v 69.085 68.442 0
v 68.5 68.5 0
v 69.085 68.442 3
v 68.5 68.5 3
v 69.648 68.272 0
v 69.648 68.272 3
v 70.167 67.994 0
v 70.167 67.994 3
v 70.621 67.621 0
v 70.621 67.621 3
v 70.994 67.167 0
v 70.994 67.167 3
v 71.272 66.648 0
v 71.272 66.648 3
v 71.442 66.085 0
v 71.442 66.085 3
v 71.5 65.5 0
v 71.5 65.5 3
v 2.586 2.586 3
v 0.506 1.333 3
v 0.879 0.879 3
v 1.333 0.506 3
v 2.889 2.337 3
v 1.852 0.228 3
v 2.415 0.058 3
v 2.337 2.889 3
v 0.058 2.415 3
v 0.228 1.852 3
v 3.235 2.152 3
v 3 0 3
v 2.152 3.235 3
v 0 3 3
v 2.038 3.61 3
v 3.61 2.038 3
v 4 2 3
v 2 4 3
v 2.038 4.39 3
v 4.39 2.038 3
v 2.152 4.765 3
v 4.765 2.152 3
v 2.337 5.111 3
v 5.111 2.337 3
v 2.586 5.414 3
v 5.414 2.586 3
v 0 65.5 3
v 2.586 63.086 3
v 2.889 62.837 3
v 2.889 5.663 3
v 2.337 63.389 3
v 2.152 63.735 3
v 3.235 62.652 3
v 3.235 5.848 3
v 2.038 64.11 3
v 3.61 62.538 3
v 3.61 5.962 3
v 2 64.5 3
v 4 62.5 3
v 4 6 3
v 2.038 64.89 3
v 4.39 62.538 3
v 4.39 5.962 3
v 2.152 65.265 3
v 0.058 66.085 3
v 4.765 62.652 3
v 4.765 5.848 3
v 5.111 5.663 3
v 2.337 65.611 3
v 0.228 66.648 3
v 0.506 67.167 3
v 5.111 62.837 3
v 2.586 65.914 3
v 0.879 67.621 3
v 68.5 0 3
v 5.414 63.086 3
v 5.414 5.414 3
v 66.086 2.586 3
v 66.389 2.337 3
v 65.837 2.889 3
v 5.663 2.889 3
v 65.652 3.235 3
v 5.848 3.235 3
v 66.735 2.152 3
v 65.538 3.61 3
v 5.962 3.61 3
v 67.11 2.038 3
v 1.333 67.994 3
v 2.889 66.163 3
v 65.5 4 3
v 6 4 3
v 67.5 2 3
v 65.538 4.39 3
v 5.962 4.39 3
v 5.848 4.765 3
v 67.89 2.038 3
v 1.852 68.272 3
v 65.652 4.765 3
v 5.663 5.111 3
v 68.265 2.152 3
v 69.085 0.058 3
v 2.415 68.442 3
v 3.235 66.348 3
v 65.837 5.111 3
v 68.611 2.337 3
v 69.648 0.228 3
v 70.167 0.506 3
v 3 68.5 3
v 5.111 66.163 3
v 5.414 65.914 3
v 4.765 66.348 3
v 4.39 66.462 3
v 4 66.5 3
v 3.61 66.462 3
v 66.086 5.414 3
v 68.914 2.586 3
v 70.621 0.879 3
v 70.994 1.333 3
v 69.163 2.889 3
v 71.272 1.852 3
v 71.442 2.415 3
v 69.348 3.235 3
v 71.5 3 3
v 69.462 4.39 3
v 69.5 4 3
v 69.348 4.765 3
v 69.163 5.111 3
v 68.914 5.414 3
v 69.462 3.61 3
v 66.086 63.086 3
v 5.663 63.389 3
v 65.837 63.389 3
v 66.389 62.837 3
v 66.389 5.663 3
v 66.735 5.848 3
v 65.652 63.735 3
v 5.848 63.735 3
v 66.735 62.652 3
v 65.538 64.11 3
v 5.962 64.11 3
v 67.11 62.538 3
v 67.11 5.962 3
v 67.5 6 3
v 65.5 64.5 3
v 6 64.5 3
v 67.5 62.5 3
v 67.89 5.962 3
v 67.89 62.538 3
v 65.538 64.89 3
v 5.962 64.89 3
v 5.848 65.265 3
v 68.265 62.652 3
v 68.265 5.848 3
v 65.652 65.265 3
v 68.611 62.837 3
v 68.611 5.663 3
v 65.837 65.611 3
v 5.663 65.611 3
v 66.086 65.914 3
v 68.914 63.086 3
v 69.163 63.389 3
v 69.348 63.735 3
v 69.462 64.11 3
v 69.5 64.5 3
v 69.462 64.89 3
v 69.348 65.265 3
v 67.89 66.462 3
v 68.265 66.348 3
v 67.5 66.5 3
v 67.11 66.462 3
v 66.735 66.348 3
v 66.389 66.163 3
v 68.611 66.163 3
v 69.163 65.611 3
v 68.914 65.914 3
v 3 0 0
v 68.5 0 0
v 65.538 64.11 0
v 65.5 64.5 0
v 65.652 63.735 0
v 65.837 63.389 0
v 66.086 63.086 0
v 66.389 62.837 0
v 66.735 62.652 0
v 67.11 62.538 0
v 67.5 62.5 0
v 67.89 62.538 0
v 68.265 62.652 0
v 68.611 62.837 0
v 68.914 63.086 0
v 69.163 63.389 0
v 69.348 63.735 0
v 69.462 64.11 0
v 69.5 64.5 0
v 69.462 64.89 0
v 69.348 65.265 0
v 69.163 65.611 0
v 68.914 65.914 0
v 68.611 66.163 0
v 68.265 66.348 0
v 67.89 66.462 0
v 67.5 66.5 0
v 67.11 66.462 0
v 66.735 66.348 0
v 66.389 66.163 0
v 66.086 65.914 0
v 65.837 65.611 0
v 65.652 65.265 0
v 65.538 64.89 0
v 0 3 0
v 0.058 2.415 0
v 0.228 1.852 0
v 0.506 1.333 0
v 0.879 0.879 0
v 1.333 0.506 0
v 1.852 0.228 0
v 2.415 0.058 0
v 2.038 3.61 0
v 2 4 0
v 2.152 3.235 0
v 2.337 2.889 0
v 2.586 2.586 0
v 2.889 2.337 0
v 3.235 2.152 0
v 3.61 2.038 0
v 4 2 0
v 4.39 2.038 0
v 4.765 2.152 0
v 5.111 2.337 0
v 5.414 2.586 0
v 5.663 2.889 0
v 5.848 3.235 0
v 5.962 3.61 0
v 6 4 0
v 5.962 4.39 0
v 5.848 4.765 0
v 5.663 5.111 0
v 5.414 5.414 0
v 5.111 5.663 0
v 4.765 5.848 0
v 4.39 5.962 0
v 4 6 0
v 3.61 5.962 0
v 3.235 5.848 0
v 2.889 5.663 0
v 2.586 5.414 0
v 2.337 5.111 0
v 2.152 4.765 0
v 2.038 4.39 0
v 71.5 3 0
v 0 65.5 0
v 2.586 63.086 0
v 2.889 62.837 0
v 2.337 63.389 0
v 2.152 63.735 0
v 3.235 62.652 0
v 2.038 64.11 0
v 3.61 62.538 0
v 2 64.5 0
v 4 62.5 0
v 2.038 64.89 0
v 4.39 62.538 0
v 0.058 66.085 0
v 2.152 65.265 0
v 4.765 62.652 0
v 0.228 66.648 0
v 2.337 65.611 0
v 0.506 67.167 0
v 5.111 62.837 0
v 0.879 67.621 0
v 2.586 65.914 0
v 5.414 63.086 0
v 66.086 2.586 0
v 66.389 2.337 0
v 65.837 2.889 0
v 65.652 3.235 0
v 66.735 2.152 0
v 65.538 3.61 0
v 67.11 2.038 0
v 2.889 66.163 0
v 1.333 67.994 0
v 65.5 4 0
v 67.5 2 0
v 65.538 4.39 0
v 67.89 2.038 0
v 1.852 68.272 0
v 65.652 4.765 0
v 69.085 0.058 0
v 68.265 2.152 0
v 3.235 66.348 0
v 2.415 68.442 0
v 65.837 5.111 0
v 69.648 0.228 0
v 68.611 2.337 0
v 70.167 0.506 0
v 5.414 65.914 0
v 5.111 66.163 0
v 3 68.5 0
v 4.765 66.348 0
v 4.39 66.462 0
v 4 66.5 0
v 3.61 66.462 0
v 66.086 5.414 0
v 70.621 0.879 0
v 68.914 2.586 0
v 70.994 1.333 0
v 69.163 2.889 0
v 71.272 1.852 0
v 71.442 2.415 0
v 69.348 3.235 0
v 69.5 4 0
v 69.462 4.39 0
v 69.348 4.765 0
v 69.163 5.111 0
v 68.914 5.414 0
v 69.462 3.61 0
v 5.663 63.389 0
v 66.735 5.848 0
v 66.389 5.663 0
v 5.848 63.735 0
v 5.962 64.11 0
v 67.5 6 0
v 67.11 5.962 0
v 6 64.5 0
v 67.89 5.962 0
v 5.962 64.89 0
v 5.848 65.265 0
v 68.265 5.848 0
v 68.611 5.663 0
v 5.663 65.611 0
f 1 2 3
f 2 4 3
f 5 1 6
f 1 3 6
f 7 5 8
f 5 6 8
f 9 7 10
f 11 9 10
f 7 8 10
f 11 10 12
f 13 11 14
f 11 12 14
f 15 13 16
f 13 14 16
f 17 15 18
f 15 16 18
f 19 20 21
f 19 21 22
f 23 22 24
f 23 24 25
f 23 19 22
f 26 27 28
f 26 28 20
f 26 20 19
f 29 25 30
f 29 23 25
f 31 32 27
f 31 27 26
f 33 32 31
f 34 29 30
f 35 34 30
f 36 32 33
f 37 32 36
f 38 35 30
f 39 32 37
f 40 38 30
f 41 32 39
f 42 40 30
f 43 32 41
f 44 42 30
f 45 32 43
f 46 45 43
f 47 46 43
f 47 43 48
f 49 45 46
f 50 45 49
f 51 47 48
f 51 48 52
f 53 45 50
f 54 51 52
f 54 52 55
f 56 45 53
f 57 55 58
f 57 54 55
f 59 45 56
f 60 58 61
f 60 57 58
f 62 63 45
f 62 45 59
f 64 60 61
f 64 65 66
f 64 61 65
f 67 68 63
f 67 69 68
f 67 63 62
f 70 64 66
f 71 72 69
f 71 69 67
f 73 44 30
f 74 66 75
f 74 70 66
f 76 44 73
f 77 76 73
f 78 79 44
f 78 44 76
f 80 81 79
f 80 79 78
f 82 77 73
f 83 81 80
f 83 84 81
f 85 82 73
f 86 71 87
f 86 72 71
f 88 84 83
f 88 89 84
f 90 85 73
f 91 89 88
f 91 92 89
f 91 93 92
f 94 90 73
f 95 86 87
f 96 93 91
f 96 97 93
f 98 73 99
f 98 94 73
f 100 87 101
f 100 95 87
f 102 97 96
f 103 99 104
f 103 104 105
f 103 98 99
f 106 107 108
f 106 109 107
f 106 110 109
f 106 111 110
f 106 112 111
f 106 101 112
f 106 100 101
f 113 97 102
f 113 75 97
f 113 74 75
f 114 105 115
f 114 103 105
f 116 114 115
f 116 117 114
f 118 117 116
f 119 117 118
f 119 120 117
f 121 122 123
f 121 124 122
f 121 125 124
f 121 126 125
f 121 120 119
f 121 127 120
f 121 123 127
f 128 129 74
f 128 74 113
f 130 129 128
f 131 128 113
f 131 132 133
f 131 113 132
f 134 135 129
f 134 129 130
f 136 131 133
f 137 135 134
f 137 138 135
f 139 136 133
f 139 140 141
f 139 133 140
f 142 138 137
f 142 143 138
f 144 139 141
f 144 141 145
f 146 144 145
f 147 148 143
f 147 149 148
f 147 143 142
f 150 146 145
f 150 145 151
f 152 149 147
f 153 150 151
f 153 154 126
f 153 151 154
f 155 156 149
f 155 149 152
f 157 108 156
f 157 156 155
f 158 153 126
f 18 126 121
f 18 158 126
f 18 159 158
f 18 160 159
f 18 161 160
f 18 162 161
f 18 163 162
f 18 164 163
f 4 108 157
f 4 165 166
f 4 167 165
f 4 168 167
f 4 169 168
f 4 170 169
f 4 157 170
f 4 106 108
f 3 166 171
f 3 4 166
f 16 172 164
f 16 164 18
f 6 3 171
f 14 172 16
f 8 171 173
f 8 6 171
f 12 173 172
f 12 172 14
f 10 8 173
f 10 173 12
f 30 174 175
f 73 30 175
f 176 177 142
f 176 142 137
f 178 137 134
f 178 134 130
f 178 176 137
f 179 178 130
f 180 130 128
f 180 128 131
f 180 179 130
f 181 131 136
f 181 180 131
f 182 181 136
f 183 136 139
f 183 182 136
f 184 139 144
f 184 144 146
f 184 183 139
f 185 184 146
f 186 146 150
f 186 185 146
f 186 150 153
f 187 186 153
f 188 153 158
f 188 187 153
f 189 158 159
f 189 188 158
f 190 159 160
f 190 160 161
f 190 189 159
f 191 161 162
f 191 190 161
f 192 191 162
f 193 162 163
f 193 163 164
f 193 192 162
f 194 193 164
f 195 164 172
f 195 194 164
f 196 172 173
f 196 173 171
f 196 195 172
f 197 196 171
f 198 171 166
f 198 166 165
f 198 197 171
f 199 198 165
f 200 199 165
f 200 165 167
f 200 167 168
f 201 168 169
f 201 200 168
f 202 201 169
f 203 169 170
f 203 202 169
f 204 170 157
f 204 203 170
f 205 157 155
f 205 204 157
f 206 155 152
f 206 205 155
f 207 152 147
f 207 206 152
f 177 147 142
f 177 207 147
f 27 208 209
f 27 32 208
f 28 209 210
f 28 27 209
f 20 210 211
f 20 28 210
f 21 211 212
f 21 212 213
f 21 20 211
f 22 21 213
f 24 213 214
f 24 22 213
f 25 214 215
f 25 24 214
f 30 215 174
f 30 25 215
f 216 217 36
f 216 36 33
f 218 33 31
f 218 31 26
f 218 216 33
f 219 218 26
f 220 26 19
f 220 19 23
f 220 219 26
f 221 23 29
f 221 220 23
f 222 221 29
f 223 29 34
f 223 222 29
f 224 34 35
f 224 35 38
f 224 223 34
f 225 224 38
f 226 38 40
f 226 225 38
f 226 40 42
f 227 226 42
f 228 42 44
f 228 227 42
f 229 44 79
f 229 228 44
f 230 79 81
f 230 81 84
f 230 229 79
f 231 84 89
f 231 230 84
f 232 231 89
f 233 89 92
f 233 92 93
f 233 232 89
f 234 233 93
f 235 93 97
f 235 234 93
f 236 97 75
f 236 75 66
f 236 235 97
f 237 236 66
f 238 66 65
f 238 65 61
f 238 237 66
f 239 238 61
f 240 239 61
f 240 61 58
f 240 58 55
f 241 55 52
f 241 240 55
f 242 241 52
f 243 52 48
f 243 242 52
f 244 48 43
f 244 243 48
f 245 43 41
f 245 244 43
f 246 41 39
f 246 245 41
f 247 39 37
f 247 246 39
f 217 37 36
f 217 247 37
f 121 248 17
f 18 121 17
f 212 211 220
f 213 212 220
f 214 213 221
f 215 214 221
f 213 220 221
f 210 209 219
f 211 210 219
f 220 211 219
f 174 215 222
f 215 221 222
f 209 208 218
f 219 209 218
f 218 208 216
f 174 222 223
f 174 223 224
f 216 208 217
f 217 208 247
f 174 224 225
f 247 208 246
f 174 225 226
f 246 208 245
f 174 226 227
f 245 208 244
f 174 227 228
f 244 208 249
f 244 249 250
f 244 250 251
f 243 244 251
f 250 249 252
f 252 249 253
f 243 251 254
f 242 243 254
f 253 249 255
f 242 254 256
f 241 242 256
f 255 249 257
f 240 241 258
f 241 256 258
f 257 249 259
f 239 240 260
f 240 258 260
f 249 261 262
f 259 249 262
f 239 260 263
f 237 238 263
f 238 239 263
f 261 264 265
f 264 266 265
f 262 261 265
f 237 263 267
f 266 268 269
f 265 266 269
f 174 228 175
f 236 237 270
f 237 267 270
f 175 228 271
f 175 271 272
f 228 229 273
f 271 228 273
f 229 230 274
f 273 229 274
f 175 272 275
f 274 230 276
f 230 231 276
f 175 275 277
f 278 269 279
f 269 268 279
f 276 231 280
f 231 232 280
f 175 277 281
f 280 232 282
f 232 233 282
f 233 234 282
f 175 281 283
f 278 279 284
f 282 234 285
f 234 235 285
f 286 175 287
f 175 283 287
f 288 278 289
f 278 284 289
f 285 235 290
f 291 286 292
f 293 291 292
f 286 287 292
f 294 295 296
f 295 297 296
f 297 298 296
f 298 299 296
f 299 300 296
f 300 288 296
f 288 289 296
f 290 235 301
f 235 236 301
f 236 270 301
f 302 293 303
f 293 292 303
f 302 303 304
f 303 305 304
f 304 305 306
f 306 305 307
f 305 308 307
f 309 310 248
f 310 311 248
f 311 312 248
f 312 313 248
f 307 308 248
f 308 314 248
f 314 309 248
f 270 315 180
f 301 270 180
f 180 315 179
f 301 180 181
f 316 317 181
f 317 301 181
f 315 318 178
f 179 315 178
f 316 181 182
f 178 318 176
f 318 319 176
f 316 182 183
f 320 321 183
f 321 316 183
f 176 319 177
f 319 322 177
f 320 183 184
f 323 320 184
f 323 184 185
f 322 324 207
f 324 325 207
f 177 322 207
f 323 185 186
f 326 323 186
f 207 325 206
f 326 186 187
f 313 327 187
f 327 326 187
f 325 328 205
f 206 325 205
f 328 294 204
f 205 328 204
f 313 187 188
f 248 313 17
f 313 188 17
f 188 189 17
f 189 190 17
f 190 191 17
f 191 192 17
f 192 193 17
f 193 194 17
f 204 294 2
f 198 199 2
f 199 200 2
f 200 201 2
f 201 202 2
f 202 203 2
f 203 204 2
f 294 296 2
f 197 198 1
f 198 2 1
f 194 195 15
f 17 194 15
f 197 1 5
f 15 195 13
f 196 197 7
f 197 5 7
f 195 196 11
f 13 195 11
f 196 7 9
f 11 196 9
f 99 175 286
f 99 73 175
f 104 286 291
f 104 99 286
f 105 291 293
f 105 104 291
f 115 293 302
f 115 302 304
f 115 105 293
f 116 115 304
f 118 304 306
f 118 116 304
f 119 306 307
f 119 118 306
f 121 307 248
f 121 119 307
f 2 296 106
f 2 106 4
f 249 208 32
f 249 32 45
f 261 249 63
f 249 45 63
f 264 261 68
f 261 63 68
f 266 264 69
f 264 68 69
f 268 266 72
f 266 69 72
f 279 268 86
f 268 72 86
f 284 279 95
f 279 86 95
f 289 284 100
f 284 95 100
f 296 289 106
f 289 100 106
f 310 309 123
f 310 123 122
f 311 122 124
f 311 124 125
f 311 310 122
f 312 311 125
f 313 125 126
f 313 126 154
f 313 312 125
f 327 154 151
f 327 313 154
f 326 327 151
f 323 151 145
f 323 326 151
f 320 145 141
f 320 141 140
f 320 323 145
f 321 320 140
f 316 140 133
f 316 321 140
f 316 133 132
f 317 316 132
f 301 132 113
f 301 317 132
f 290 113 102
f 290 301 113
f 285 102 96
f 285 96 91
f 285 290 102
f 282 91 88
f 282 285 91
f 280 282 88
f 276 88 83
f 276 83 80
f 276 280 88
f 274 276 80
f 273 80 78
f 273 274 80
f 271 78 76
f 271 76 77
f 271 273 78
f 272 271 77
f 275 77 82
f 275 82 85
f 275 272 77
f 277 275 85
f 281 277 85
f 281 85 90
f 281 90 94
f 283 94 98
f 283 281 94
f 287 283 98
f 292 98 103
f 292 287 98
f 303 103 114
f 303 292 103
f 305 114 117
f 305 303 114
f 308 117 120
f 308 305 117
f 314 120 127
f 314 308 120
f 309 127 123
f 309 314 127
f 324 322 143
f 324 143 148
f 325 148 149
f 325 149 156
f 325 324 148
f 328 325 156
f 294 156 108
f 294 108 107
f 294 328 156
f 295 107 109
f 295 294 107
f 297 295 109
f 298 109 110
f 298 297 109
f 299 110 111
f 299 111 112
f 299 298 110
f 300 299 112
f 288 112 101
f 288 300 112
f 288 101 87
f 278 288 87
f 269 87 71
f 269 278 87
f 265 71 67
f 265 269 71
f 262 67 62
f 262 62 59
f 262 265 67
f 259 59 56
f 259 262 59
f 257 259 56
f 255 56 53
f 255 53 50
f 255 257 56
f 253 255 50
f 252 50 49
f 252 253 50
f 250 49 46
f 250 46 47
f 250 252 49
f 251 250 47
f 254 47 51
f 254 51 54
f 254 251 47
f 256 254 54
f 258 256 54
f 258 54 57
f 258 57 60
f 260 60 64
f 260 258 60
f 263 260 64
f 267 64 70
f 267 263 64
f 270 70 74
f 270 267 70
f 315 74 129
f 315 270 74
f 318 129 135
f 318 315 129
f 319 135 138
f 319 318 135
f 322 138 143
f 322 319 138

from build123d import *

# Parameters (mm, degrees)
ESBO_O1_W                = 71.5
ESBO_O1_H                = 68.5
ESBO_O1_R                = 2
RESSALTO_EXTRUS_O1_DEPTH = 3
FILETE1_R                = 3


with BuildPart() as part:
    # Esboço1 → Ressalto-extrusão1 (new body)
    with BuildSketch(Plane.XY):
        with Locations((35.75, 34.25)):
            Rectangle(ESBO_O1_W, ESBO_O1_H)
        with Locations((4, 64.5)):
            Circle(ESBO_O1_R, mode=Mode.SUBTRACT)
        with Locations(Location((67.5, 64.5, 0), (0, 0, 180))):
            Circle(ESBO_O1_R, mode=Mode.SUBTRACT)
        with Locations((67.5, 4)):
            Circle(ESBO_O1_R, mode=Mode.SUBTRACT)
        with Locations(Location((4, 4, 0), (0, 0, 180))):
            Circle(ESBO_O1_R, mode=Mode.SUBTRACT)
    extrude(amount=RESSALTO_EXTRUS_O1_DEPTH)

    # Filete1
    filete1_edges = [part.edges().sort_by_distance(p)[0] for p in [
        (0, 68.5, 1.5),
        (71.5, 68.5, 1.5),
        (71.5, 0, 1.5),
        (0, 0, 1.5),
    ]]
    fillet(filete1_edges, radius=FILETE1_R)


solid = part.part
